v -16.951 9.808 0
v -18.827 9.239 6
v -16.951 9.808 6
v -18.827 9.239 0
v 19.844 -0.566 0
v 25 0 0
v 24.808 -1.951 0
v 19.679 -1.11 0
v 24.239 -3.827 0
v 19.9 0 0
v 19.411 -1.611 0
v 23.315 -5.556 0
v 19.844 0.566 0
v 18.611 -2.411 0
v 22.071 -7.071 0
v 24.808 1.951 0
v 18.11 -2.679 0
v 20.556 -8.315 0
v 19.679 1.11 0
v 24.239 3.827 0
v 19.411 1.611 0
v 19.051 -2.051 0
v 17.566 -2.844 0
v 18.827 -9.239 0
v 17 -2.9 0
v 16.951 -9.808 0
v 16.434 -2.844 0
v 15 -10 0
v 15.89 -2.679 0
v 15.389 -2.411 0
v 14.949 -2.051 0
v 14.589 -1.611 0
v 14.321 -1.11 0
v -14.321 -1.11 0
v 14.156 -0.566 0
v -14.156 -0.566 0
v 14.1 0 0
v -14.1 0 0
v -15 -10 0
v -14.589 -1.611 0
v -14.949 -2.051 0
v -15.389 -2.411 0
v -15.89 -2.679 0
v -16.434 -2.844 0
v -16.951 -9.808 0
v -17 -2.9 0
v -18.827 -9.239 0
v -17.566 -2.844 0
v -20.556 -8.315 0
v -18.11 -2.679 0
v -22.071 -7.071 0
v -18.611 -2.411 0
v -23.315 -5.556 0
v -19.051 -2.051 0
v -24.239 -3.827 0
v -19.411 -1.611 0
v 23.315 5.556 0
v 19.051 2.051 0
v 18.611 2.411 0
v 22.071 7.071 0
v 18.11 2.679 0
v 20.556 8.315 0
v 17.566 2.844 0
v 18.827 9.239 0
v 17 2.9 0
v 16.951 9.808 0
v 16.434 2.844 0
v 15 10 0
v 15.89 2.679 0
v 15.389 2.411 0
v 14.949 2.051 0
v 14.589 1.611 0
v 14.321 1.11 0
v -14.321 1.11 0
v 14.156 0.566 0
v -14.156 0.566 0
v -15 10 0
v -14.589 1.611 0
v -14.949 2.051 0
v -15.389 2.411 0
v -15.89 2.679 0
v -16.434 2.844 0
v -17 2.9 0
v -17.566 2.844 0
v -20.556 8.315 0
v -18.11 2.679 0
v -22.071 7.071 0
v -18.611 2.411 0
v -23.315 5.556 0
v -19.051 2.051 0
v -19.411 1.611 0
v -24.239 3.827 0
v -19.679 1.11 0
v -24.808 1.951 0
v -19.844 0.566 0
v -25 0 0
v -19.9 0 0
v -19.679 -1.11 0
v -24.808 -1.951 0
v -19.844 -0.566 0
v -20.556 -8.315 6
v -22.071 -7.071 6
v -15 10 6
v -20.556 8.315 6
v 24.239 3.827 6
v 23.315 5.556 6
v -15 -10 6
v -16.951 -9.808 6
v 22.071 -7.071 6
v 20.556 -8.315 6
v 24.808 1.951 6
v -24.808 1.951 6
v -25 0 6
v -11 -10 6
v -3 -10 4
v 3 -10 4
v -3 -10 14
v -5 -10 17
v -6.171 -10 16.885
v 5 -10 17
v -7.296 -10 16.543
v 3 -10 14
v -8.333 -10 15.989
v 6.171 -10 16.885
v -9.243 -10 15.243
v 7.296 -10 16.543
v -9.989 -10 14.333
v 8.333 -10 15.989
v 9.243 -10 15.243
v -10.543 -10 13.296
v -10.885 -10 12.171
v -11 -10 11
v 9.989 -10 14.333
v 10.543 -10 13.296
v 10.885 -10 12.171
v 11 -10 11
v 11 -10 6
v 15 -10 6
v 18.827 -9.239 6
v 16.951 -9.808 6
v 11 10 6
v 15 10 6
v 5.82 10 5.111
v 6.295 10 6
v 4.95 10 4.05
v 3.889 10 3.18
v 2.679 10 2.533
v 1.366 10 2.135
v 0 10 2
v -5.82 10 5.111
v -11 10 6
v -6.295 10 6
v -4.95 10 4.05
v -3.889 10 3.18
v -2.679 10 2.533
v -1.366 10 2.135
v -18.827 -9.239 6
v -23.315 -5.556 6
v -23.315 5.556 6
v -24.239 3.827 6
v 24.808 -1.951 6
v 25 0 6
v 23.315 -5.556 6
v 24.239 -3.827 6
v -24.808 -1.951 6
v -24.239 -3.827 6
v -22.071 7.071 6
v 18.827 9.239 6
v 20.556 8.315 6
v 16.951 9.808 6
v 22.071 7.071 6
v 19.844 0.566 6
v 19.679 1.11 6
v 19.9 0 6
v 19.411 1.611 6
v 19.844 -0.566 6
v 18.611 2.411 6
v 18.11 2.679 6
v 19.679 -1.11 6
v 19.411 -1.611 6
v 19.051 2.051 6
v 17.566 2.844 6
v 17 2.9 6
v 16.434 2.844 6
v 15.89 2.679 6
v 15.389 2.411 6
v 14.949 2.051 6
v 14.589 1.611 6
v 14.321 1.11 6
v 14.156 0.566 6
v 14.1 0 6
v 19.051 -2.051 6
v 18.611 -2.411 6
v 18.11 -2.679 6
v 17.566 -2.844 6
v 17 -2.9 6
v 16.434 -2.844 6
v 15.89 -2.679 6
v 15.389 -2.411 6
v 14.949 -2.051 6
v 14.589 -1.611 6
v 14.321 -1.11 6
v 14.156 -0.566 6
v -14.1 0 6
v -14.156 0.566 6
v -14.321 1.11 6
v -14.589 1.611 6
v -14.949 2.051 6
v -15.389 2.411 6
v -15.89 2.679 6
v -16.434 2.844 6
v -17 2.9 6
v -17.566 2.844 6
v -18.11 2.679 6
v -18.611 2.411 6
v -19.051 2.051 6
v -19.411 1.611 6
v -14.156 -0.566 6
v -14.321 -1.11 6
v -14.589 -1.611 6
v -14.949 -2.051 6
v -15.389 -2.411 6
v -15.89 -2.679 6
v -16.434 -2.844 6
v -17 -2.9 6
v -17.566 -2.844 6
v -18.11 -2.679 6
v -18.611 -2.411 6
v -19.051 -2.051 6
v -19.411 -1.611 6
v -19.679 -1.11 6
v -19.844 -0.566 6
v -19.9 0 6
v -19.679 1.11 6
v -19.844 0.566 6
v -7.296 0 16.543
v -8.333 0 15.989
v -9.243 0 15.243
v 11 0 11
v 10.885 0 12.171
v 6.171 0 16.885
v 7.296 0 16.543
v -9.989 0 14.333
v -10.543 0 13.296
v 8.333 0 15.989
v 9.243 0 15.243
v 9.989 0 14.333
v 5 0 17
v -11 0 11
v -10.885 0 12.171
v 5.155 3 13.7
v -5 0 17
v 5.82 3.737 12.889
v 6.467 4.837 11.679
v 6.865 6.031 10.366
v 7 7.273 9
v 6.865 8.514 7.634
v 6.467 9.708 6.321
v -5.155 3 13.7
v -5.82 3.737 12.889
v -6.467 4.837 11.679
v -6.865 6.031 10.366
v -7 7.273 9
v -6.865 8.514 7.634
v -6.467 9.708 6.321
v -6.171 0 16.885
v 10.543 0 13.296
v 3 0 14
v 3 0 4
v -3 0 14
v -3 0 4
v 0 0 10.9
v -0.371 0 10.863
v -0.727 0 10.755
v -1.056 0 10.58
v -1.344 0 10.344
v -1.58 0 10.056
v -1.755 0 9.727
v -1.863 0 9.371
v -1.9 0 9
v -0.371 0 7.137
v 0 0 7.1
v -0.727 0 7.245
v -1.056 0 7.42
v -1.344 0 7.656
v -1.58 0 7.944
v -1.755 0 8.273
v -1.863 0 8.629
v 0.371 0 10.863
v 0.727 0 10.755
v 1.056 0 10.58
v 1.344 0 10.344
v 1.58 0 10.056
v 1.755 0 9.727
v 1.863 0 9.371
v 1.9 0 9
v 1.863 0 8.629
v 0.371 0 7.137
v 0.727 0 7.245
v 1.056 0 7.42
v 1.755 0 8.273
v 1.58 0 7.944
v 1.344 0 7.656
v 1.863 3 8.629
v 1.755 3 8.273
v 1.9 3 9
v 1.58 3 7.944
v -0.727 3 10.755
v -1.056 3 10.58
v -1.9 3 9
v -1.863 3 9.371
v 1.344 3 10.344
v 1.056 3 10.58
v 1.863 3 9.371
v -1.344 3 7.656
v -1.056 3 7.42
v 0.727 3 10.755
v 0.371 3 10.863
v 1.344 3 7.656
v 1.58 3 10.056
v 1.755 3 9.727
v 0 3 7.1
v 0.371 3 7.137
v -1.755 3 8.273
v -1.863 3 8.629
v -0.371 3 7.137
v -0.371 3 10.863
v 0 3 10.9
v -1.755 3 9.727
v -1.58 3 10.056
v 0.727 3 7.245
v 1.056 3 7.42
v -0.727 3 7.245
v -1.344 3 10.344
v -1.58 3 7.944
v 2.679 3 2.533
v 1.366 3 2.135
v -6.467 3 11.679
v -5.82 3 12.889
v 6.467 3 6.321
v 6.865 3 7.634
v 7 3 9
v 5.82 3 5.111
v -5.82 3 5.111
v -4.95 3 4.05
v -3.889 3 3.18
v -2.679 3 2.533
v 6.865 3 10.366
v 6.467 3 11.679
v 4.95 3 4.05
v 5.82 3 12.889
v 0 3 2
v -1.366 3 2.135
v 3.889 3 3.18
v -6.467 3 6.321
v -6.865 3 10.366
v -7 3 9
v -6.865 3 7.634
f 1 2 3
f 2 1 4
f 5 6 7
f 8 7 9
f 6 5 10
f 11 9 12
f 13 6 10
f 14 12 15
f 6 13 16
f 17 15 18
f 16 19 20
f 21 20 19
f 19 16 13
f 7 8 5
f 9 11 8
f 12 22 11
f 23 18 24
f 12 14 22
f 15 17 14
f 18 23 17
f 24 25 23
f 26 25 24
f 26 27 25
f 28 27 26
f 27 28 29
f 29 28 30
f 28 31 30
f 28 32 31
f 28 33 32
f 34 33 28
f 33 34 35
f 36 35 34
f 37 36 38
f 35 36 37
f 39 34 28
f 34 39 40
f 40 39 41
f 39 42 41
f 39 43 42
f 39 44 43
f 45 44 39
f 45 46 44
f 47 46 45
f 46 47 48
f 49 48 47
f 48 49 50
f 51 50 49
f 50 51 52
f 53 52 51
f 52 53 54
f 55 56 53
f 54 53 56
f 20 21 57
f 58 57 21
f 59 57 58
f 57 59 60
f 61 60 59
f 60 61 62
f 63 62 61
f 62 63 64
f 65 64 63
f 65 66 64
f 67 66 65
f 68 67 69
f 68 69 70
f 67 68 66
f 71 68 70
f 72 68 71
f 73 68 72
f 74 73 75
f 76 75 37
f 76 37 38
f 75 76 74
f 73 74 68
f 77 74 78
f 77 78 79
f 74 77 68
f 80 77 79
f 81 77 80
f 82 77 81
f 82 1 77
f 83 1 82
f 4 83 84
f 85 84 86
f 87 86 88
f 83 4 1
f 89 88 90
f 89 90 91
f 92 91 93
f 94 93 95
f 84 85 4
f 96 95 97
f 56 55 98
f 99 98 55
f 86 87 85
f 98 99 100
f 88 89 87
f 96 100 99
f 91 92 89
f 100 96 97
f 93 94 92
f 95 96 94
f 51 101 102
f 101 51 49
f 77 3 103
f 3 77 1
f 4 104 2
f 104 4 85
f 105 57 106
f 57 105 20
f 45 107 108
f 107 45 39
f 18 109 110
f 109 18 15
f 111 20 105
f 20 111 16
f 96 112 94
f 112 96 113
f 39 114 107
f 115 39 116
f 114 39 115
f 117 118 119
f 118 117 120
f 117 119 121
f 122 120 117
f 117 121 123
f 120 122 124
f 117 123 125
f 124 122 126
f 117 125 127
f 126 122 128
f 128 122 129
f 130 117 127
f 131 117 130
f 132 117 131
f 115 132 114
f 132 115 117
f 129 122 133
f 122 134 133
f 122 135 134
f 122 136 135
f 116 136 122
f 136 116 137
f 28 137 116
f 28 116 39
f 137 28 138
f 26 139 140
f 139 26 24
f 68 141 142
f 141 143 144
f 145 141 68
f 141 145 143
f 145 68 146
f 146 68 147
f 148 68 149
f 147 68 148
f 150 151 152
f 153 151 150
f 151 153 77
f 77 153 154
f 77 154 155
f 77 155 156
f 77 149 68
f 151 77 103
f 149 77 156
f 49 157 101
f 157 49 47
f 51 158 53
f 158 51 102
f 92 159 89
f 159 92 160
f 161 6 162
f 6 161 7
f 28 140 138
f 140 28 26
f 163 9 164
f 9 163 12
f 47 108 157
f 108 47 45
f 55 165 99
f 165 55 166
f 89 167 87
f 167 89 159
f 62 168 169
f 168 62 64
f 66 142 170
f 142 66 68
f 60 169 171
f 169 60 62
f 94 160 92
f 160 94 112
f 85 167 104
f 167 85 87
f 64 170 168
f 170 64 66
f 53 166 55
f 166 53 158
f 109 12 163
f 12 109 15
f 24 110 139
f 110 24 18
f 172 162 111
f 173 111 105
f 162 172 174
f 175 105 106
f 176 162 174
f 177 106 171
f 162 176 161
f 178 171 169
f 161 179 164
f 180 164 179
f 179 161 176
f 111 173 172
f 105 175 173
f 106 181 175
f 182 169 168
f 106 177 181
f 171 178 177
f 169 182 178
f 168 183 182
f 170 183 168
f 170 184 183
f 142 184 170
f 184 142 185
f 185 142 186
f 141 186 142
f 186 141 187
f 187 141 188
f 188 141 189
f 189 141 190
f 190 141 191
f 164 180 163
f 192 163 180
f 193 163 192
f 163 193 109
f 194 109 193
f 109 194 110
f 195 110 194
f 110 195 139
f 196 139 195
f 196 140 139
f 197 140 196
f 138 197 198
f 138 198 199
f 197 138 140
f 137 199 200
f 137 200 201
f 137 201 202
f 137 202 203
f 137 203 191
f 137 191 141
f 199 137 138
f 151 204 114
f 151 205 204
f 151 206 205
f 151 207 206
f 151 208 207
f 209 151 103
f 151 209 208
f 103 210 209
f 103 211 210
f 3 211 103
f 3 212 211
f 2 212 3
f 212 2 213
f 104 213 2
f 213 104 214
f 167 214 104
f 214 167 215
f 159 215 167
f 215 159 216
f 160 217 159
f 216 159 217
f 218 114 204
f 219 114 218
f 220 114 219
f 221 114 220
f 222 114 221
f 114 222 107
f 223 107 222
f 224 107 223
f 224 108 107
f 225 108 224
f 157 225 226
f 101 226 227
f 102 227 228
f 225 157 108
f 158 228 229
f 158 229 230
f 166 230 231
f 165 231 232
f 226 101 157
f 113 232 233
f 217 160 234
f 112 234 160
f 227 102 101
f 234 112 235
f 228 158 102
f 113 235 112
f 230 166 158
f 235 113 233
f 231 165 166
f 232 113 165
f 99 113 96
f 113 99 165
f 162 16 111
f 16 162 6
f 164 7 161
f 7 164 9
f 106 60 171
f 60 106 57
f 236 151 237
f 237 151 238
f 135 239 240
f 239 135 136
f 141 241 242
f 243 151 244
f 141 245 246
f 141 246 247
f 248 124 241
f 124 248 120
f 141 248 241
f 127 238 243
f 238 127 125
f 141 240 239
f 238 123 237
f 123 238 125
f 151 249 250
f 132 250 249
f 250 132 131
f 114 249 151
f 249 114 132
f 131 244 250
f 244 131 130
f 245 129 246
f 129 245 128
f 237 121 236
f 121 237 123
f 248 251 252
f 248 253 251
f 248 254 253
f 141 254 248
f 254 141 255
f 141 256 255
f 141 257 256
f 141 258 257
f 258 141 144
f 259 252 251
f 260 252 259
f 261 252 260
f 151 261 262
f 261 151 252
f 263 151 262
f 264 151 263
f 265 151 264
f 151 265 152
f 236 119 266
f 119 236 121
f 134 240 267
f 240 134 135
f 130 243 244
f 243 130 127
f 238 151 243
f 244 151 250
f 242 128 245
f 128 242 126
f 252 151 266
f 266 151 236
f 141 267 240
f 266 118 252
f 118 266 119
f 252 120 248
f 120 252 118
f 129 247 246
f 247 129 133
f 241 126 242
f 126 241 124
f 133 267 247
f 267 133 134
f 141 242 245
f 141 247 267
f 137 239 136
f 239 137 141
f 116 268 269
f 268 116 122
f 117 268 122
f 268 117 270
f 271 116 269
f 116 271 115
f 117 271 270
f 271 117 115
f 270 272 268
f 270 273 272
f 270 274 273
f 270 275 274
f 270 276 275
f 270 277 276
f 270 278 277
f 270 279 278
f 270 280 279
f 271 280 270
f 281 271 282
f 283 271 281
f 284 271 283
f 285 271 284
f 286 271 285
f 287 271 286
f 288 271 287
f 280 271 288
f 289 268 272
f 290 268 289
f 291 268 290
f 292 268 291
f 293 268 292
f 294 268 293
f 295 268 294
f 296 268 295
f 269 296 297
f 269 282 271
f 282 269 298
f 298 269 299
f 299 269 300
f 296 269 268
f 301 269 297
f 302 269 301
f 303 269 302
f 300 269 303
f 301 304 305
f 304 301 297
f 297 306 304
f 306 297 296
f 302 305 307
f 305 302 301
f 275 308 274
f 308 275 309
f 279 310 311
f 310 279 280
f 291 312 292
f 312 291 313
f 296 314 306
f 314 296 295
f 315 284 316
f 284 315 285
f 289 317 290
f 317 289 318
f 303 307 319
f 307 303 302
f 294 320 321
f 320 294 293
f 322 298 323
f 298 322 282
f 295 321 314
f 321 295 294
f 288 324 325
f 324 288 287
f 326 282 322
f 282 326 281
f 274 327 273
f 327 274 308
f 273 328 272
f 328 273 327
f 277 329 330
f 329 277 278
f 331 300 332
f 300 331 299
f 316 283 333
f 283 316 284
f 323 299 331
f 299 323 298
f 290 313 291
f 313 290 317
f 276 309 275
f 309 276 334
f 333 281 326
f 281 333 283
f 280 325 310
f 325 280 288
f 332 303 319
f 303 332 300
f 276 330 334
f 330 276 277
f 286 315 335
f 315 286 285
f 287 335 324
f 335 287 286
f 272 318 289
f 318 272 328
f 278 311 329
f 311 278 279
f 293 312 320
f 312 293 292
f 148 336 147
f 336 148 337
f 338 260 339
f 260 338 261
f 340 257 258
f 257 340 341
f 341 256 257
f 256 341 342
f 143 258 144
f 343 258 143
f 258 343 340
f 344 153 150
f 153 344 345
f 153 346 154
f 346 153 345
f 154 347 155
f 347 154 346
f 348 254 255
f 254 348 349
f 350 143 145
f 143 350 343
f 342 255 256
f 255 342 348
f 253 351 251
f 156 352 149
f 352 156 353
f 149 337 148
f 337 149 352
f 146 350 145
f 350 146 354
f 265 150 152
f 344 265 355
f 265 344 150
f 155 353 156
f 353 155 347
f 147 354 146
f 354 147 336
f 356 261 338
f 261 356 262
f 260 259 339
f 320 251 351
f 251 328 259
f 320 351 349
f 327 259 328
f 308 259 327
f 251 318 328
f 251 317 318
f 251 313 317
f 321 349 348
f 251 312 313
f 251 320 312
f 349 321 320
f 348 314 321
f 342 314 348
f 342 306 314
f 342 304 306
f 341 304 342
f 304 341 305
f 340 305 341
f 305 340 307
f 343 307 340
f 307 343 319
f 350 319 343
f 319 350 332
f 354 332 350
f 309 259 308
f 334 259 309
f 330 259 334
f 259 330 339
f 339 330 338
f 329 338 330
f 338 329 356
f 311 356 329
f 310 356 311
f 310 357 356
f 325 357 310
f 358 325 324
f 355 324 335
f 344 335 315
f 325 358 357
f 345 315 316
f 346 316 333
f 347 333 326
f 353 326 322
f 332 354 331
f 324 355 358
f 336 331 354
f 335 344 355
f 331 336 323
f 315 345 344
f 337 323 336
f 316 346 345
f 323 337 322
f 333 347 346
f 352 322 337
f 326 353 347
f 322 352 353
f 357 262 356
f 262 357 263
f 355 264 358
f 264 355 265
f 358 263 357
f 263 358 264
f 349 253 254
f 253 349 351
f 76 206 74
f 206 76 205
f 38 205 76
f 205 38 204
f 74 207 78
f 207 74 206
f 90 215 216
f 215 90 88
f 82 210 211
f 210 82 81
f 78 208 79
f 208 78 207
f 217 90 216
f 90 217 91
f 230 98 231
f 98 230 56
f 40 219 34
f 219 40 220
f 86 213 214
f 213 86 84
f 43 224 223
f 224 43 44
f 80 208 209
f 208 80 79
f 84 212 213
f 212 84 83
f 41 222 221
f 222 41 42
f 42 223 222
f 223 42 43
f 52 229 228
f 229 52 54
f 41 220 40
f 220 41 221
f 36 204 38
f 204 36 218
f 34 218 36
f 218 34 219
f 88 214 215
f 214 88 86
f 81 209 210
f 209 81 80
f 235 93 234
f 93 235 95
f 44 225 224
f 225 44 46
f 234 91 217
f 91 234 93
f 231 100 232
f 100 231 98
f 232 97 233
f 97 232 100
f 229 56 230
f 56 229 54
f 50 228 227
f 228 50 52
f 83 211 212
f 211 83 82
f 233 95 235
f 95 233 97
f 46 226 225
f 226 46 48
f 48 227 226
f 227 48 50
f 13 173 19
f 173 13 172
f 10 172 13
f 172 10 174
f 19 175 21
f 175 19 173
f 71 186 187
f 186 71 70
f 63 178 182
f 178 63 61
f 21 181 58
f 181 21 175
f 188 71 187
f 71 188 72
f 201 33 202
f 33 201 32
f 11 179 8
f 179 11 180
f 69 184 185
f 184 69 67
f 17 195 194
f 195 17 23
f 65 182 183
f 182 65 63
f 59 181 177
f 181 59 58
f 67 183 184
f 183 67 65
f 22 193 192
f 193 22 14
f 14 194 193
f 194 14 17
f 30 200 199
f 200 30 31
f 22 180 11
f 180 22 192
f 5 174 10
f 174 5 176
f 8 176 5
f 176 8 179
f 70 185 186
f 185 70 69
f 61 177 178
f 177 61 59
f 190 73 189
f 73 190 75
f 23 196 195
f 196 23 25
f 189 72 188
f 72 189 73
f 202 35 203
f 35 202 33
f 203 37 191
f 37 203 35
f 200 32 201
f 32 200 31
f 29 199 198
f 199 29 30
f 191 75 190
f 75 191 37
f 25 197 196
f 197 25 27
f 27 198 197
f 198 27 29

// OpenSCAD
$fn=32;

module nut3(h=50) {
    hull() {
        translate([3.1,0,0]) cylinder(d=0.5,h=4);
        rotate([0,0,60]) translate([3.1,0,0]) cylinder(d=0.5,h=4);
        rotate([0,0,120]) translate([3.1,0,0]) cylinder(d=0.5,h=4);
        rotate([0,0,180]) translate([3.1,0,0]) cylinder(d=0.5,h=4);
        rotate([0,0,240]) translate([3.1,0,0]) cylinder(d=0.5,h=4);
        rotate([0,0,300]) translate([3.1,0,0]) cylinder(d=0.5,h=4);
    }
}

module tensioner() {
    difference() {
        union() {
            translate([0,-2.5,-4.5]) cube([18,5,9]);
            intersection() {
                cylinder(d=21,h=22,center=true);
                translate([-9,-6,-11]) cube([25,12,22]);
            }
        }
        translate([-3,0,0]) cylinder(d=20,h=16,center=true);
        translate([-3,0,0]) cylinder(d=5.4,h=30,center=true); 
        translate([9,0,0]) rotate([0,-90,0]) nut3();
        rotate([0,90,0]) cylinder(d=3.3,h=40);
    }
}

module ytensioner() {
    difference() {
        union() {
            hull() {
                translate([-15,0,0]) cylinder(d=20,h=6);
                translate([15,0,0]) cylinder(d=20,h=6);
            }
            hull() {
                translate([0,0,11]) rotate([90,0,0]) {
                    translate([-5,0,0]) cylinder(d=12,h=10);
                    translate([5,0,0]) cylinder(d=12,h=10);
                }
                translate([-11,-10,0]) cube([22,20,6]);
            }
        }
        translate([-3,-20,4]) cube([6,20,10]);
        translate([0,-1,9]) rotate([-90,0,0]) cylinder(d=3.8,h=30);
        translate([0,3,9]) rotate([-90,0,0]) cylinder(d=14,h=30);
        
        translate([-17,0,-1]) cylinder(d=5.8,h=10);
        translate([17,0,-1]) cylinder(d=5.8,h=10);
    }
}

ytensioner();
*tensioner();
